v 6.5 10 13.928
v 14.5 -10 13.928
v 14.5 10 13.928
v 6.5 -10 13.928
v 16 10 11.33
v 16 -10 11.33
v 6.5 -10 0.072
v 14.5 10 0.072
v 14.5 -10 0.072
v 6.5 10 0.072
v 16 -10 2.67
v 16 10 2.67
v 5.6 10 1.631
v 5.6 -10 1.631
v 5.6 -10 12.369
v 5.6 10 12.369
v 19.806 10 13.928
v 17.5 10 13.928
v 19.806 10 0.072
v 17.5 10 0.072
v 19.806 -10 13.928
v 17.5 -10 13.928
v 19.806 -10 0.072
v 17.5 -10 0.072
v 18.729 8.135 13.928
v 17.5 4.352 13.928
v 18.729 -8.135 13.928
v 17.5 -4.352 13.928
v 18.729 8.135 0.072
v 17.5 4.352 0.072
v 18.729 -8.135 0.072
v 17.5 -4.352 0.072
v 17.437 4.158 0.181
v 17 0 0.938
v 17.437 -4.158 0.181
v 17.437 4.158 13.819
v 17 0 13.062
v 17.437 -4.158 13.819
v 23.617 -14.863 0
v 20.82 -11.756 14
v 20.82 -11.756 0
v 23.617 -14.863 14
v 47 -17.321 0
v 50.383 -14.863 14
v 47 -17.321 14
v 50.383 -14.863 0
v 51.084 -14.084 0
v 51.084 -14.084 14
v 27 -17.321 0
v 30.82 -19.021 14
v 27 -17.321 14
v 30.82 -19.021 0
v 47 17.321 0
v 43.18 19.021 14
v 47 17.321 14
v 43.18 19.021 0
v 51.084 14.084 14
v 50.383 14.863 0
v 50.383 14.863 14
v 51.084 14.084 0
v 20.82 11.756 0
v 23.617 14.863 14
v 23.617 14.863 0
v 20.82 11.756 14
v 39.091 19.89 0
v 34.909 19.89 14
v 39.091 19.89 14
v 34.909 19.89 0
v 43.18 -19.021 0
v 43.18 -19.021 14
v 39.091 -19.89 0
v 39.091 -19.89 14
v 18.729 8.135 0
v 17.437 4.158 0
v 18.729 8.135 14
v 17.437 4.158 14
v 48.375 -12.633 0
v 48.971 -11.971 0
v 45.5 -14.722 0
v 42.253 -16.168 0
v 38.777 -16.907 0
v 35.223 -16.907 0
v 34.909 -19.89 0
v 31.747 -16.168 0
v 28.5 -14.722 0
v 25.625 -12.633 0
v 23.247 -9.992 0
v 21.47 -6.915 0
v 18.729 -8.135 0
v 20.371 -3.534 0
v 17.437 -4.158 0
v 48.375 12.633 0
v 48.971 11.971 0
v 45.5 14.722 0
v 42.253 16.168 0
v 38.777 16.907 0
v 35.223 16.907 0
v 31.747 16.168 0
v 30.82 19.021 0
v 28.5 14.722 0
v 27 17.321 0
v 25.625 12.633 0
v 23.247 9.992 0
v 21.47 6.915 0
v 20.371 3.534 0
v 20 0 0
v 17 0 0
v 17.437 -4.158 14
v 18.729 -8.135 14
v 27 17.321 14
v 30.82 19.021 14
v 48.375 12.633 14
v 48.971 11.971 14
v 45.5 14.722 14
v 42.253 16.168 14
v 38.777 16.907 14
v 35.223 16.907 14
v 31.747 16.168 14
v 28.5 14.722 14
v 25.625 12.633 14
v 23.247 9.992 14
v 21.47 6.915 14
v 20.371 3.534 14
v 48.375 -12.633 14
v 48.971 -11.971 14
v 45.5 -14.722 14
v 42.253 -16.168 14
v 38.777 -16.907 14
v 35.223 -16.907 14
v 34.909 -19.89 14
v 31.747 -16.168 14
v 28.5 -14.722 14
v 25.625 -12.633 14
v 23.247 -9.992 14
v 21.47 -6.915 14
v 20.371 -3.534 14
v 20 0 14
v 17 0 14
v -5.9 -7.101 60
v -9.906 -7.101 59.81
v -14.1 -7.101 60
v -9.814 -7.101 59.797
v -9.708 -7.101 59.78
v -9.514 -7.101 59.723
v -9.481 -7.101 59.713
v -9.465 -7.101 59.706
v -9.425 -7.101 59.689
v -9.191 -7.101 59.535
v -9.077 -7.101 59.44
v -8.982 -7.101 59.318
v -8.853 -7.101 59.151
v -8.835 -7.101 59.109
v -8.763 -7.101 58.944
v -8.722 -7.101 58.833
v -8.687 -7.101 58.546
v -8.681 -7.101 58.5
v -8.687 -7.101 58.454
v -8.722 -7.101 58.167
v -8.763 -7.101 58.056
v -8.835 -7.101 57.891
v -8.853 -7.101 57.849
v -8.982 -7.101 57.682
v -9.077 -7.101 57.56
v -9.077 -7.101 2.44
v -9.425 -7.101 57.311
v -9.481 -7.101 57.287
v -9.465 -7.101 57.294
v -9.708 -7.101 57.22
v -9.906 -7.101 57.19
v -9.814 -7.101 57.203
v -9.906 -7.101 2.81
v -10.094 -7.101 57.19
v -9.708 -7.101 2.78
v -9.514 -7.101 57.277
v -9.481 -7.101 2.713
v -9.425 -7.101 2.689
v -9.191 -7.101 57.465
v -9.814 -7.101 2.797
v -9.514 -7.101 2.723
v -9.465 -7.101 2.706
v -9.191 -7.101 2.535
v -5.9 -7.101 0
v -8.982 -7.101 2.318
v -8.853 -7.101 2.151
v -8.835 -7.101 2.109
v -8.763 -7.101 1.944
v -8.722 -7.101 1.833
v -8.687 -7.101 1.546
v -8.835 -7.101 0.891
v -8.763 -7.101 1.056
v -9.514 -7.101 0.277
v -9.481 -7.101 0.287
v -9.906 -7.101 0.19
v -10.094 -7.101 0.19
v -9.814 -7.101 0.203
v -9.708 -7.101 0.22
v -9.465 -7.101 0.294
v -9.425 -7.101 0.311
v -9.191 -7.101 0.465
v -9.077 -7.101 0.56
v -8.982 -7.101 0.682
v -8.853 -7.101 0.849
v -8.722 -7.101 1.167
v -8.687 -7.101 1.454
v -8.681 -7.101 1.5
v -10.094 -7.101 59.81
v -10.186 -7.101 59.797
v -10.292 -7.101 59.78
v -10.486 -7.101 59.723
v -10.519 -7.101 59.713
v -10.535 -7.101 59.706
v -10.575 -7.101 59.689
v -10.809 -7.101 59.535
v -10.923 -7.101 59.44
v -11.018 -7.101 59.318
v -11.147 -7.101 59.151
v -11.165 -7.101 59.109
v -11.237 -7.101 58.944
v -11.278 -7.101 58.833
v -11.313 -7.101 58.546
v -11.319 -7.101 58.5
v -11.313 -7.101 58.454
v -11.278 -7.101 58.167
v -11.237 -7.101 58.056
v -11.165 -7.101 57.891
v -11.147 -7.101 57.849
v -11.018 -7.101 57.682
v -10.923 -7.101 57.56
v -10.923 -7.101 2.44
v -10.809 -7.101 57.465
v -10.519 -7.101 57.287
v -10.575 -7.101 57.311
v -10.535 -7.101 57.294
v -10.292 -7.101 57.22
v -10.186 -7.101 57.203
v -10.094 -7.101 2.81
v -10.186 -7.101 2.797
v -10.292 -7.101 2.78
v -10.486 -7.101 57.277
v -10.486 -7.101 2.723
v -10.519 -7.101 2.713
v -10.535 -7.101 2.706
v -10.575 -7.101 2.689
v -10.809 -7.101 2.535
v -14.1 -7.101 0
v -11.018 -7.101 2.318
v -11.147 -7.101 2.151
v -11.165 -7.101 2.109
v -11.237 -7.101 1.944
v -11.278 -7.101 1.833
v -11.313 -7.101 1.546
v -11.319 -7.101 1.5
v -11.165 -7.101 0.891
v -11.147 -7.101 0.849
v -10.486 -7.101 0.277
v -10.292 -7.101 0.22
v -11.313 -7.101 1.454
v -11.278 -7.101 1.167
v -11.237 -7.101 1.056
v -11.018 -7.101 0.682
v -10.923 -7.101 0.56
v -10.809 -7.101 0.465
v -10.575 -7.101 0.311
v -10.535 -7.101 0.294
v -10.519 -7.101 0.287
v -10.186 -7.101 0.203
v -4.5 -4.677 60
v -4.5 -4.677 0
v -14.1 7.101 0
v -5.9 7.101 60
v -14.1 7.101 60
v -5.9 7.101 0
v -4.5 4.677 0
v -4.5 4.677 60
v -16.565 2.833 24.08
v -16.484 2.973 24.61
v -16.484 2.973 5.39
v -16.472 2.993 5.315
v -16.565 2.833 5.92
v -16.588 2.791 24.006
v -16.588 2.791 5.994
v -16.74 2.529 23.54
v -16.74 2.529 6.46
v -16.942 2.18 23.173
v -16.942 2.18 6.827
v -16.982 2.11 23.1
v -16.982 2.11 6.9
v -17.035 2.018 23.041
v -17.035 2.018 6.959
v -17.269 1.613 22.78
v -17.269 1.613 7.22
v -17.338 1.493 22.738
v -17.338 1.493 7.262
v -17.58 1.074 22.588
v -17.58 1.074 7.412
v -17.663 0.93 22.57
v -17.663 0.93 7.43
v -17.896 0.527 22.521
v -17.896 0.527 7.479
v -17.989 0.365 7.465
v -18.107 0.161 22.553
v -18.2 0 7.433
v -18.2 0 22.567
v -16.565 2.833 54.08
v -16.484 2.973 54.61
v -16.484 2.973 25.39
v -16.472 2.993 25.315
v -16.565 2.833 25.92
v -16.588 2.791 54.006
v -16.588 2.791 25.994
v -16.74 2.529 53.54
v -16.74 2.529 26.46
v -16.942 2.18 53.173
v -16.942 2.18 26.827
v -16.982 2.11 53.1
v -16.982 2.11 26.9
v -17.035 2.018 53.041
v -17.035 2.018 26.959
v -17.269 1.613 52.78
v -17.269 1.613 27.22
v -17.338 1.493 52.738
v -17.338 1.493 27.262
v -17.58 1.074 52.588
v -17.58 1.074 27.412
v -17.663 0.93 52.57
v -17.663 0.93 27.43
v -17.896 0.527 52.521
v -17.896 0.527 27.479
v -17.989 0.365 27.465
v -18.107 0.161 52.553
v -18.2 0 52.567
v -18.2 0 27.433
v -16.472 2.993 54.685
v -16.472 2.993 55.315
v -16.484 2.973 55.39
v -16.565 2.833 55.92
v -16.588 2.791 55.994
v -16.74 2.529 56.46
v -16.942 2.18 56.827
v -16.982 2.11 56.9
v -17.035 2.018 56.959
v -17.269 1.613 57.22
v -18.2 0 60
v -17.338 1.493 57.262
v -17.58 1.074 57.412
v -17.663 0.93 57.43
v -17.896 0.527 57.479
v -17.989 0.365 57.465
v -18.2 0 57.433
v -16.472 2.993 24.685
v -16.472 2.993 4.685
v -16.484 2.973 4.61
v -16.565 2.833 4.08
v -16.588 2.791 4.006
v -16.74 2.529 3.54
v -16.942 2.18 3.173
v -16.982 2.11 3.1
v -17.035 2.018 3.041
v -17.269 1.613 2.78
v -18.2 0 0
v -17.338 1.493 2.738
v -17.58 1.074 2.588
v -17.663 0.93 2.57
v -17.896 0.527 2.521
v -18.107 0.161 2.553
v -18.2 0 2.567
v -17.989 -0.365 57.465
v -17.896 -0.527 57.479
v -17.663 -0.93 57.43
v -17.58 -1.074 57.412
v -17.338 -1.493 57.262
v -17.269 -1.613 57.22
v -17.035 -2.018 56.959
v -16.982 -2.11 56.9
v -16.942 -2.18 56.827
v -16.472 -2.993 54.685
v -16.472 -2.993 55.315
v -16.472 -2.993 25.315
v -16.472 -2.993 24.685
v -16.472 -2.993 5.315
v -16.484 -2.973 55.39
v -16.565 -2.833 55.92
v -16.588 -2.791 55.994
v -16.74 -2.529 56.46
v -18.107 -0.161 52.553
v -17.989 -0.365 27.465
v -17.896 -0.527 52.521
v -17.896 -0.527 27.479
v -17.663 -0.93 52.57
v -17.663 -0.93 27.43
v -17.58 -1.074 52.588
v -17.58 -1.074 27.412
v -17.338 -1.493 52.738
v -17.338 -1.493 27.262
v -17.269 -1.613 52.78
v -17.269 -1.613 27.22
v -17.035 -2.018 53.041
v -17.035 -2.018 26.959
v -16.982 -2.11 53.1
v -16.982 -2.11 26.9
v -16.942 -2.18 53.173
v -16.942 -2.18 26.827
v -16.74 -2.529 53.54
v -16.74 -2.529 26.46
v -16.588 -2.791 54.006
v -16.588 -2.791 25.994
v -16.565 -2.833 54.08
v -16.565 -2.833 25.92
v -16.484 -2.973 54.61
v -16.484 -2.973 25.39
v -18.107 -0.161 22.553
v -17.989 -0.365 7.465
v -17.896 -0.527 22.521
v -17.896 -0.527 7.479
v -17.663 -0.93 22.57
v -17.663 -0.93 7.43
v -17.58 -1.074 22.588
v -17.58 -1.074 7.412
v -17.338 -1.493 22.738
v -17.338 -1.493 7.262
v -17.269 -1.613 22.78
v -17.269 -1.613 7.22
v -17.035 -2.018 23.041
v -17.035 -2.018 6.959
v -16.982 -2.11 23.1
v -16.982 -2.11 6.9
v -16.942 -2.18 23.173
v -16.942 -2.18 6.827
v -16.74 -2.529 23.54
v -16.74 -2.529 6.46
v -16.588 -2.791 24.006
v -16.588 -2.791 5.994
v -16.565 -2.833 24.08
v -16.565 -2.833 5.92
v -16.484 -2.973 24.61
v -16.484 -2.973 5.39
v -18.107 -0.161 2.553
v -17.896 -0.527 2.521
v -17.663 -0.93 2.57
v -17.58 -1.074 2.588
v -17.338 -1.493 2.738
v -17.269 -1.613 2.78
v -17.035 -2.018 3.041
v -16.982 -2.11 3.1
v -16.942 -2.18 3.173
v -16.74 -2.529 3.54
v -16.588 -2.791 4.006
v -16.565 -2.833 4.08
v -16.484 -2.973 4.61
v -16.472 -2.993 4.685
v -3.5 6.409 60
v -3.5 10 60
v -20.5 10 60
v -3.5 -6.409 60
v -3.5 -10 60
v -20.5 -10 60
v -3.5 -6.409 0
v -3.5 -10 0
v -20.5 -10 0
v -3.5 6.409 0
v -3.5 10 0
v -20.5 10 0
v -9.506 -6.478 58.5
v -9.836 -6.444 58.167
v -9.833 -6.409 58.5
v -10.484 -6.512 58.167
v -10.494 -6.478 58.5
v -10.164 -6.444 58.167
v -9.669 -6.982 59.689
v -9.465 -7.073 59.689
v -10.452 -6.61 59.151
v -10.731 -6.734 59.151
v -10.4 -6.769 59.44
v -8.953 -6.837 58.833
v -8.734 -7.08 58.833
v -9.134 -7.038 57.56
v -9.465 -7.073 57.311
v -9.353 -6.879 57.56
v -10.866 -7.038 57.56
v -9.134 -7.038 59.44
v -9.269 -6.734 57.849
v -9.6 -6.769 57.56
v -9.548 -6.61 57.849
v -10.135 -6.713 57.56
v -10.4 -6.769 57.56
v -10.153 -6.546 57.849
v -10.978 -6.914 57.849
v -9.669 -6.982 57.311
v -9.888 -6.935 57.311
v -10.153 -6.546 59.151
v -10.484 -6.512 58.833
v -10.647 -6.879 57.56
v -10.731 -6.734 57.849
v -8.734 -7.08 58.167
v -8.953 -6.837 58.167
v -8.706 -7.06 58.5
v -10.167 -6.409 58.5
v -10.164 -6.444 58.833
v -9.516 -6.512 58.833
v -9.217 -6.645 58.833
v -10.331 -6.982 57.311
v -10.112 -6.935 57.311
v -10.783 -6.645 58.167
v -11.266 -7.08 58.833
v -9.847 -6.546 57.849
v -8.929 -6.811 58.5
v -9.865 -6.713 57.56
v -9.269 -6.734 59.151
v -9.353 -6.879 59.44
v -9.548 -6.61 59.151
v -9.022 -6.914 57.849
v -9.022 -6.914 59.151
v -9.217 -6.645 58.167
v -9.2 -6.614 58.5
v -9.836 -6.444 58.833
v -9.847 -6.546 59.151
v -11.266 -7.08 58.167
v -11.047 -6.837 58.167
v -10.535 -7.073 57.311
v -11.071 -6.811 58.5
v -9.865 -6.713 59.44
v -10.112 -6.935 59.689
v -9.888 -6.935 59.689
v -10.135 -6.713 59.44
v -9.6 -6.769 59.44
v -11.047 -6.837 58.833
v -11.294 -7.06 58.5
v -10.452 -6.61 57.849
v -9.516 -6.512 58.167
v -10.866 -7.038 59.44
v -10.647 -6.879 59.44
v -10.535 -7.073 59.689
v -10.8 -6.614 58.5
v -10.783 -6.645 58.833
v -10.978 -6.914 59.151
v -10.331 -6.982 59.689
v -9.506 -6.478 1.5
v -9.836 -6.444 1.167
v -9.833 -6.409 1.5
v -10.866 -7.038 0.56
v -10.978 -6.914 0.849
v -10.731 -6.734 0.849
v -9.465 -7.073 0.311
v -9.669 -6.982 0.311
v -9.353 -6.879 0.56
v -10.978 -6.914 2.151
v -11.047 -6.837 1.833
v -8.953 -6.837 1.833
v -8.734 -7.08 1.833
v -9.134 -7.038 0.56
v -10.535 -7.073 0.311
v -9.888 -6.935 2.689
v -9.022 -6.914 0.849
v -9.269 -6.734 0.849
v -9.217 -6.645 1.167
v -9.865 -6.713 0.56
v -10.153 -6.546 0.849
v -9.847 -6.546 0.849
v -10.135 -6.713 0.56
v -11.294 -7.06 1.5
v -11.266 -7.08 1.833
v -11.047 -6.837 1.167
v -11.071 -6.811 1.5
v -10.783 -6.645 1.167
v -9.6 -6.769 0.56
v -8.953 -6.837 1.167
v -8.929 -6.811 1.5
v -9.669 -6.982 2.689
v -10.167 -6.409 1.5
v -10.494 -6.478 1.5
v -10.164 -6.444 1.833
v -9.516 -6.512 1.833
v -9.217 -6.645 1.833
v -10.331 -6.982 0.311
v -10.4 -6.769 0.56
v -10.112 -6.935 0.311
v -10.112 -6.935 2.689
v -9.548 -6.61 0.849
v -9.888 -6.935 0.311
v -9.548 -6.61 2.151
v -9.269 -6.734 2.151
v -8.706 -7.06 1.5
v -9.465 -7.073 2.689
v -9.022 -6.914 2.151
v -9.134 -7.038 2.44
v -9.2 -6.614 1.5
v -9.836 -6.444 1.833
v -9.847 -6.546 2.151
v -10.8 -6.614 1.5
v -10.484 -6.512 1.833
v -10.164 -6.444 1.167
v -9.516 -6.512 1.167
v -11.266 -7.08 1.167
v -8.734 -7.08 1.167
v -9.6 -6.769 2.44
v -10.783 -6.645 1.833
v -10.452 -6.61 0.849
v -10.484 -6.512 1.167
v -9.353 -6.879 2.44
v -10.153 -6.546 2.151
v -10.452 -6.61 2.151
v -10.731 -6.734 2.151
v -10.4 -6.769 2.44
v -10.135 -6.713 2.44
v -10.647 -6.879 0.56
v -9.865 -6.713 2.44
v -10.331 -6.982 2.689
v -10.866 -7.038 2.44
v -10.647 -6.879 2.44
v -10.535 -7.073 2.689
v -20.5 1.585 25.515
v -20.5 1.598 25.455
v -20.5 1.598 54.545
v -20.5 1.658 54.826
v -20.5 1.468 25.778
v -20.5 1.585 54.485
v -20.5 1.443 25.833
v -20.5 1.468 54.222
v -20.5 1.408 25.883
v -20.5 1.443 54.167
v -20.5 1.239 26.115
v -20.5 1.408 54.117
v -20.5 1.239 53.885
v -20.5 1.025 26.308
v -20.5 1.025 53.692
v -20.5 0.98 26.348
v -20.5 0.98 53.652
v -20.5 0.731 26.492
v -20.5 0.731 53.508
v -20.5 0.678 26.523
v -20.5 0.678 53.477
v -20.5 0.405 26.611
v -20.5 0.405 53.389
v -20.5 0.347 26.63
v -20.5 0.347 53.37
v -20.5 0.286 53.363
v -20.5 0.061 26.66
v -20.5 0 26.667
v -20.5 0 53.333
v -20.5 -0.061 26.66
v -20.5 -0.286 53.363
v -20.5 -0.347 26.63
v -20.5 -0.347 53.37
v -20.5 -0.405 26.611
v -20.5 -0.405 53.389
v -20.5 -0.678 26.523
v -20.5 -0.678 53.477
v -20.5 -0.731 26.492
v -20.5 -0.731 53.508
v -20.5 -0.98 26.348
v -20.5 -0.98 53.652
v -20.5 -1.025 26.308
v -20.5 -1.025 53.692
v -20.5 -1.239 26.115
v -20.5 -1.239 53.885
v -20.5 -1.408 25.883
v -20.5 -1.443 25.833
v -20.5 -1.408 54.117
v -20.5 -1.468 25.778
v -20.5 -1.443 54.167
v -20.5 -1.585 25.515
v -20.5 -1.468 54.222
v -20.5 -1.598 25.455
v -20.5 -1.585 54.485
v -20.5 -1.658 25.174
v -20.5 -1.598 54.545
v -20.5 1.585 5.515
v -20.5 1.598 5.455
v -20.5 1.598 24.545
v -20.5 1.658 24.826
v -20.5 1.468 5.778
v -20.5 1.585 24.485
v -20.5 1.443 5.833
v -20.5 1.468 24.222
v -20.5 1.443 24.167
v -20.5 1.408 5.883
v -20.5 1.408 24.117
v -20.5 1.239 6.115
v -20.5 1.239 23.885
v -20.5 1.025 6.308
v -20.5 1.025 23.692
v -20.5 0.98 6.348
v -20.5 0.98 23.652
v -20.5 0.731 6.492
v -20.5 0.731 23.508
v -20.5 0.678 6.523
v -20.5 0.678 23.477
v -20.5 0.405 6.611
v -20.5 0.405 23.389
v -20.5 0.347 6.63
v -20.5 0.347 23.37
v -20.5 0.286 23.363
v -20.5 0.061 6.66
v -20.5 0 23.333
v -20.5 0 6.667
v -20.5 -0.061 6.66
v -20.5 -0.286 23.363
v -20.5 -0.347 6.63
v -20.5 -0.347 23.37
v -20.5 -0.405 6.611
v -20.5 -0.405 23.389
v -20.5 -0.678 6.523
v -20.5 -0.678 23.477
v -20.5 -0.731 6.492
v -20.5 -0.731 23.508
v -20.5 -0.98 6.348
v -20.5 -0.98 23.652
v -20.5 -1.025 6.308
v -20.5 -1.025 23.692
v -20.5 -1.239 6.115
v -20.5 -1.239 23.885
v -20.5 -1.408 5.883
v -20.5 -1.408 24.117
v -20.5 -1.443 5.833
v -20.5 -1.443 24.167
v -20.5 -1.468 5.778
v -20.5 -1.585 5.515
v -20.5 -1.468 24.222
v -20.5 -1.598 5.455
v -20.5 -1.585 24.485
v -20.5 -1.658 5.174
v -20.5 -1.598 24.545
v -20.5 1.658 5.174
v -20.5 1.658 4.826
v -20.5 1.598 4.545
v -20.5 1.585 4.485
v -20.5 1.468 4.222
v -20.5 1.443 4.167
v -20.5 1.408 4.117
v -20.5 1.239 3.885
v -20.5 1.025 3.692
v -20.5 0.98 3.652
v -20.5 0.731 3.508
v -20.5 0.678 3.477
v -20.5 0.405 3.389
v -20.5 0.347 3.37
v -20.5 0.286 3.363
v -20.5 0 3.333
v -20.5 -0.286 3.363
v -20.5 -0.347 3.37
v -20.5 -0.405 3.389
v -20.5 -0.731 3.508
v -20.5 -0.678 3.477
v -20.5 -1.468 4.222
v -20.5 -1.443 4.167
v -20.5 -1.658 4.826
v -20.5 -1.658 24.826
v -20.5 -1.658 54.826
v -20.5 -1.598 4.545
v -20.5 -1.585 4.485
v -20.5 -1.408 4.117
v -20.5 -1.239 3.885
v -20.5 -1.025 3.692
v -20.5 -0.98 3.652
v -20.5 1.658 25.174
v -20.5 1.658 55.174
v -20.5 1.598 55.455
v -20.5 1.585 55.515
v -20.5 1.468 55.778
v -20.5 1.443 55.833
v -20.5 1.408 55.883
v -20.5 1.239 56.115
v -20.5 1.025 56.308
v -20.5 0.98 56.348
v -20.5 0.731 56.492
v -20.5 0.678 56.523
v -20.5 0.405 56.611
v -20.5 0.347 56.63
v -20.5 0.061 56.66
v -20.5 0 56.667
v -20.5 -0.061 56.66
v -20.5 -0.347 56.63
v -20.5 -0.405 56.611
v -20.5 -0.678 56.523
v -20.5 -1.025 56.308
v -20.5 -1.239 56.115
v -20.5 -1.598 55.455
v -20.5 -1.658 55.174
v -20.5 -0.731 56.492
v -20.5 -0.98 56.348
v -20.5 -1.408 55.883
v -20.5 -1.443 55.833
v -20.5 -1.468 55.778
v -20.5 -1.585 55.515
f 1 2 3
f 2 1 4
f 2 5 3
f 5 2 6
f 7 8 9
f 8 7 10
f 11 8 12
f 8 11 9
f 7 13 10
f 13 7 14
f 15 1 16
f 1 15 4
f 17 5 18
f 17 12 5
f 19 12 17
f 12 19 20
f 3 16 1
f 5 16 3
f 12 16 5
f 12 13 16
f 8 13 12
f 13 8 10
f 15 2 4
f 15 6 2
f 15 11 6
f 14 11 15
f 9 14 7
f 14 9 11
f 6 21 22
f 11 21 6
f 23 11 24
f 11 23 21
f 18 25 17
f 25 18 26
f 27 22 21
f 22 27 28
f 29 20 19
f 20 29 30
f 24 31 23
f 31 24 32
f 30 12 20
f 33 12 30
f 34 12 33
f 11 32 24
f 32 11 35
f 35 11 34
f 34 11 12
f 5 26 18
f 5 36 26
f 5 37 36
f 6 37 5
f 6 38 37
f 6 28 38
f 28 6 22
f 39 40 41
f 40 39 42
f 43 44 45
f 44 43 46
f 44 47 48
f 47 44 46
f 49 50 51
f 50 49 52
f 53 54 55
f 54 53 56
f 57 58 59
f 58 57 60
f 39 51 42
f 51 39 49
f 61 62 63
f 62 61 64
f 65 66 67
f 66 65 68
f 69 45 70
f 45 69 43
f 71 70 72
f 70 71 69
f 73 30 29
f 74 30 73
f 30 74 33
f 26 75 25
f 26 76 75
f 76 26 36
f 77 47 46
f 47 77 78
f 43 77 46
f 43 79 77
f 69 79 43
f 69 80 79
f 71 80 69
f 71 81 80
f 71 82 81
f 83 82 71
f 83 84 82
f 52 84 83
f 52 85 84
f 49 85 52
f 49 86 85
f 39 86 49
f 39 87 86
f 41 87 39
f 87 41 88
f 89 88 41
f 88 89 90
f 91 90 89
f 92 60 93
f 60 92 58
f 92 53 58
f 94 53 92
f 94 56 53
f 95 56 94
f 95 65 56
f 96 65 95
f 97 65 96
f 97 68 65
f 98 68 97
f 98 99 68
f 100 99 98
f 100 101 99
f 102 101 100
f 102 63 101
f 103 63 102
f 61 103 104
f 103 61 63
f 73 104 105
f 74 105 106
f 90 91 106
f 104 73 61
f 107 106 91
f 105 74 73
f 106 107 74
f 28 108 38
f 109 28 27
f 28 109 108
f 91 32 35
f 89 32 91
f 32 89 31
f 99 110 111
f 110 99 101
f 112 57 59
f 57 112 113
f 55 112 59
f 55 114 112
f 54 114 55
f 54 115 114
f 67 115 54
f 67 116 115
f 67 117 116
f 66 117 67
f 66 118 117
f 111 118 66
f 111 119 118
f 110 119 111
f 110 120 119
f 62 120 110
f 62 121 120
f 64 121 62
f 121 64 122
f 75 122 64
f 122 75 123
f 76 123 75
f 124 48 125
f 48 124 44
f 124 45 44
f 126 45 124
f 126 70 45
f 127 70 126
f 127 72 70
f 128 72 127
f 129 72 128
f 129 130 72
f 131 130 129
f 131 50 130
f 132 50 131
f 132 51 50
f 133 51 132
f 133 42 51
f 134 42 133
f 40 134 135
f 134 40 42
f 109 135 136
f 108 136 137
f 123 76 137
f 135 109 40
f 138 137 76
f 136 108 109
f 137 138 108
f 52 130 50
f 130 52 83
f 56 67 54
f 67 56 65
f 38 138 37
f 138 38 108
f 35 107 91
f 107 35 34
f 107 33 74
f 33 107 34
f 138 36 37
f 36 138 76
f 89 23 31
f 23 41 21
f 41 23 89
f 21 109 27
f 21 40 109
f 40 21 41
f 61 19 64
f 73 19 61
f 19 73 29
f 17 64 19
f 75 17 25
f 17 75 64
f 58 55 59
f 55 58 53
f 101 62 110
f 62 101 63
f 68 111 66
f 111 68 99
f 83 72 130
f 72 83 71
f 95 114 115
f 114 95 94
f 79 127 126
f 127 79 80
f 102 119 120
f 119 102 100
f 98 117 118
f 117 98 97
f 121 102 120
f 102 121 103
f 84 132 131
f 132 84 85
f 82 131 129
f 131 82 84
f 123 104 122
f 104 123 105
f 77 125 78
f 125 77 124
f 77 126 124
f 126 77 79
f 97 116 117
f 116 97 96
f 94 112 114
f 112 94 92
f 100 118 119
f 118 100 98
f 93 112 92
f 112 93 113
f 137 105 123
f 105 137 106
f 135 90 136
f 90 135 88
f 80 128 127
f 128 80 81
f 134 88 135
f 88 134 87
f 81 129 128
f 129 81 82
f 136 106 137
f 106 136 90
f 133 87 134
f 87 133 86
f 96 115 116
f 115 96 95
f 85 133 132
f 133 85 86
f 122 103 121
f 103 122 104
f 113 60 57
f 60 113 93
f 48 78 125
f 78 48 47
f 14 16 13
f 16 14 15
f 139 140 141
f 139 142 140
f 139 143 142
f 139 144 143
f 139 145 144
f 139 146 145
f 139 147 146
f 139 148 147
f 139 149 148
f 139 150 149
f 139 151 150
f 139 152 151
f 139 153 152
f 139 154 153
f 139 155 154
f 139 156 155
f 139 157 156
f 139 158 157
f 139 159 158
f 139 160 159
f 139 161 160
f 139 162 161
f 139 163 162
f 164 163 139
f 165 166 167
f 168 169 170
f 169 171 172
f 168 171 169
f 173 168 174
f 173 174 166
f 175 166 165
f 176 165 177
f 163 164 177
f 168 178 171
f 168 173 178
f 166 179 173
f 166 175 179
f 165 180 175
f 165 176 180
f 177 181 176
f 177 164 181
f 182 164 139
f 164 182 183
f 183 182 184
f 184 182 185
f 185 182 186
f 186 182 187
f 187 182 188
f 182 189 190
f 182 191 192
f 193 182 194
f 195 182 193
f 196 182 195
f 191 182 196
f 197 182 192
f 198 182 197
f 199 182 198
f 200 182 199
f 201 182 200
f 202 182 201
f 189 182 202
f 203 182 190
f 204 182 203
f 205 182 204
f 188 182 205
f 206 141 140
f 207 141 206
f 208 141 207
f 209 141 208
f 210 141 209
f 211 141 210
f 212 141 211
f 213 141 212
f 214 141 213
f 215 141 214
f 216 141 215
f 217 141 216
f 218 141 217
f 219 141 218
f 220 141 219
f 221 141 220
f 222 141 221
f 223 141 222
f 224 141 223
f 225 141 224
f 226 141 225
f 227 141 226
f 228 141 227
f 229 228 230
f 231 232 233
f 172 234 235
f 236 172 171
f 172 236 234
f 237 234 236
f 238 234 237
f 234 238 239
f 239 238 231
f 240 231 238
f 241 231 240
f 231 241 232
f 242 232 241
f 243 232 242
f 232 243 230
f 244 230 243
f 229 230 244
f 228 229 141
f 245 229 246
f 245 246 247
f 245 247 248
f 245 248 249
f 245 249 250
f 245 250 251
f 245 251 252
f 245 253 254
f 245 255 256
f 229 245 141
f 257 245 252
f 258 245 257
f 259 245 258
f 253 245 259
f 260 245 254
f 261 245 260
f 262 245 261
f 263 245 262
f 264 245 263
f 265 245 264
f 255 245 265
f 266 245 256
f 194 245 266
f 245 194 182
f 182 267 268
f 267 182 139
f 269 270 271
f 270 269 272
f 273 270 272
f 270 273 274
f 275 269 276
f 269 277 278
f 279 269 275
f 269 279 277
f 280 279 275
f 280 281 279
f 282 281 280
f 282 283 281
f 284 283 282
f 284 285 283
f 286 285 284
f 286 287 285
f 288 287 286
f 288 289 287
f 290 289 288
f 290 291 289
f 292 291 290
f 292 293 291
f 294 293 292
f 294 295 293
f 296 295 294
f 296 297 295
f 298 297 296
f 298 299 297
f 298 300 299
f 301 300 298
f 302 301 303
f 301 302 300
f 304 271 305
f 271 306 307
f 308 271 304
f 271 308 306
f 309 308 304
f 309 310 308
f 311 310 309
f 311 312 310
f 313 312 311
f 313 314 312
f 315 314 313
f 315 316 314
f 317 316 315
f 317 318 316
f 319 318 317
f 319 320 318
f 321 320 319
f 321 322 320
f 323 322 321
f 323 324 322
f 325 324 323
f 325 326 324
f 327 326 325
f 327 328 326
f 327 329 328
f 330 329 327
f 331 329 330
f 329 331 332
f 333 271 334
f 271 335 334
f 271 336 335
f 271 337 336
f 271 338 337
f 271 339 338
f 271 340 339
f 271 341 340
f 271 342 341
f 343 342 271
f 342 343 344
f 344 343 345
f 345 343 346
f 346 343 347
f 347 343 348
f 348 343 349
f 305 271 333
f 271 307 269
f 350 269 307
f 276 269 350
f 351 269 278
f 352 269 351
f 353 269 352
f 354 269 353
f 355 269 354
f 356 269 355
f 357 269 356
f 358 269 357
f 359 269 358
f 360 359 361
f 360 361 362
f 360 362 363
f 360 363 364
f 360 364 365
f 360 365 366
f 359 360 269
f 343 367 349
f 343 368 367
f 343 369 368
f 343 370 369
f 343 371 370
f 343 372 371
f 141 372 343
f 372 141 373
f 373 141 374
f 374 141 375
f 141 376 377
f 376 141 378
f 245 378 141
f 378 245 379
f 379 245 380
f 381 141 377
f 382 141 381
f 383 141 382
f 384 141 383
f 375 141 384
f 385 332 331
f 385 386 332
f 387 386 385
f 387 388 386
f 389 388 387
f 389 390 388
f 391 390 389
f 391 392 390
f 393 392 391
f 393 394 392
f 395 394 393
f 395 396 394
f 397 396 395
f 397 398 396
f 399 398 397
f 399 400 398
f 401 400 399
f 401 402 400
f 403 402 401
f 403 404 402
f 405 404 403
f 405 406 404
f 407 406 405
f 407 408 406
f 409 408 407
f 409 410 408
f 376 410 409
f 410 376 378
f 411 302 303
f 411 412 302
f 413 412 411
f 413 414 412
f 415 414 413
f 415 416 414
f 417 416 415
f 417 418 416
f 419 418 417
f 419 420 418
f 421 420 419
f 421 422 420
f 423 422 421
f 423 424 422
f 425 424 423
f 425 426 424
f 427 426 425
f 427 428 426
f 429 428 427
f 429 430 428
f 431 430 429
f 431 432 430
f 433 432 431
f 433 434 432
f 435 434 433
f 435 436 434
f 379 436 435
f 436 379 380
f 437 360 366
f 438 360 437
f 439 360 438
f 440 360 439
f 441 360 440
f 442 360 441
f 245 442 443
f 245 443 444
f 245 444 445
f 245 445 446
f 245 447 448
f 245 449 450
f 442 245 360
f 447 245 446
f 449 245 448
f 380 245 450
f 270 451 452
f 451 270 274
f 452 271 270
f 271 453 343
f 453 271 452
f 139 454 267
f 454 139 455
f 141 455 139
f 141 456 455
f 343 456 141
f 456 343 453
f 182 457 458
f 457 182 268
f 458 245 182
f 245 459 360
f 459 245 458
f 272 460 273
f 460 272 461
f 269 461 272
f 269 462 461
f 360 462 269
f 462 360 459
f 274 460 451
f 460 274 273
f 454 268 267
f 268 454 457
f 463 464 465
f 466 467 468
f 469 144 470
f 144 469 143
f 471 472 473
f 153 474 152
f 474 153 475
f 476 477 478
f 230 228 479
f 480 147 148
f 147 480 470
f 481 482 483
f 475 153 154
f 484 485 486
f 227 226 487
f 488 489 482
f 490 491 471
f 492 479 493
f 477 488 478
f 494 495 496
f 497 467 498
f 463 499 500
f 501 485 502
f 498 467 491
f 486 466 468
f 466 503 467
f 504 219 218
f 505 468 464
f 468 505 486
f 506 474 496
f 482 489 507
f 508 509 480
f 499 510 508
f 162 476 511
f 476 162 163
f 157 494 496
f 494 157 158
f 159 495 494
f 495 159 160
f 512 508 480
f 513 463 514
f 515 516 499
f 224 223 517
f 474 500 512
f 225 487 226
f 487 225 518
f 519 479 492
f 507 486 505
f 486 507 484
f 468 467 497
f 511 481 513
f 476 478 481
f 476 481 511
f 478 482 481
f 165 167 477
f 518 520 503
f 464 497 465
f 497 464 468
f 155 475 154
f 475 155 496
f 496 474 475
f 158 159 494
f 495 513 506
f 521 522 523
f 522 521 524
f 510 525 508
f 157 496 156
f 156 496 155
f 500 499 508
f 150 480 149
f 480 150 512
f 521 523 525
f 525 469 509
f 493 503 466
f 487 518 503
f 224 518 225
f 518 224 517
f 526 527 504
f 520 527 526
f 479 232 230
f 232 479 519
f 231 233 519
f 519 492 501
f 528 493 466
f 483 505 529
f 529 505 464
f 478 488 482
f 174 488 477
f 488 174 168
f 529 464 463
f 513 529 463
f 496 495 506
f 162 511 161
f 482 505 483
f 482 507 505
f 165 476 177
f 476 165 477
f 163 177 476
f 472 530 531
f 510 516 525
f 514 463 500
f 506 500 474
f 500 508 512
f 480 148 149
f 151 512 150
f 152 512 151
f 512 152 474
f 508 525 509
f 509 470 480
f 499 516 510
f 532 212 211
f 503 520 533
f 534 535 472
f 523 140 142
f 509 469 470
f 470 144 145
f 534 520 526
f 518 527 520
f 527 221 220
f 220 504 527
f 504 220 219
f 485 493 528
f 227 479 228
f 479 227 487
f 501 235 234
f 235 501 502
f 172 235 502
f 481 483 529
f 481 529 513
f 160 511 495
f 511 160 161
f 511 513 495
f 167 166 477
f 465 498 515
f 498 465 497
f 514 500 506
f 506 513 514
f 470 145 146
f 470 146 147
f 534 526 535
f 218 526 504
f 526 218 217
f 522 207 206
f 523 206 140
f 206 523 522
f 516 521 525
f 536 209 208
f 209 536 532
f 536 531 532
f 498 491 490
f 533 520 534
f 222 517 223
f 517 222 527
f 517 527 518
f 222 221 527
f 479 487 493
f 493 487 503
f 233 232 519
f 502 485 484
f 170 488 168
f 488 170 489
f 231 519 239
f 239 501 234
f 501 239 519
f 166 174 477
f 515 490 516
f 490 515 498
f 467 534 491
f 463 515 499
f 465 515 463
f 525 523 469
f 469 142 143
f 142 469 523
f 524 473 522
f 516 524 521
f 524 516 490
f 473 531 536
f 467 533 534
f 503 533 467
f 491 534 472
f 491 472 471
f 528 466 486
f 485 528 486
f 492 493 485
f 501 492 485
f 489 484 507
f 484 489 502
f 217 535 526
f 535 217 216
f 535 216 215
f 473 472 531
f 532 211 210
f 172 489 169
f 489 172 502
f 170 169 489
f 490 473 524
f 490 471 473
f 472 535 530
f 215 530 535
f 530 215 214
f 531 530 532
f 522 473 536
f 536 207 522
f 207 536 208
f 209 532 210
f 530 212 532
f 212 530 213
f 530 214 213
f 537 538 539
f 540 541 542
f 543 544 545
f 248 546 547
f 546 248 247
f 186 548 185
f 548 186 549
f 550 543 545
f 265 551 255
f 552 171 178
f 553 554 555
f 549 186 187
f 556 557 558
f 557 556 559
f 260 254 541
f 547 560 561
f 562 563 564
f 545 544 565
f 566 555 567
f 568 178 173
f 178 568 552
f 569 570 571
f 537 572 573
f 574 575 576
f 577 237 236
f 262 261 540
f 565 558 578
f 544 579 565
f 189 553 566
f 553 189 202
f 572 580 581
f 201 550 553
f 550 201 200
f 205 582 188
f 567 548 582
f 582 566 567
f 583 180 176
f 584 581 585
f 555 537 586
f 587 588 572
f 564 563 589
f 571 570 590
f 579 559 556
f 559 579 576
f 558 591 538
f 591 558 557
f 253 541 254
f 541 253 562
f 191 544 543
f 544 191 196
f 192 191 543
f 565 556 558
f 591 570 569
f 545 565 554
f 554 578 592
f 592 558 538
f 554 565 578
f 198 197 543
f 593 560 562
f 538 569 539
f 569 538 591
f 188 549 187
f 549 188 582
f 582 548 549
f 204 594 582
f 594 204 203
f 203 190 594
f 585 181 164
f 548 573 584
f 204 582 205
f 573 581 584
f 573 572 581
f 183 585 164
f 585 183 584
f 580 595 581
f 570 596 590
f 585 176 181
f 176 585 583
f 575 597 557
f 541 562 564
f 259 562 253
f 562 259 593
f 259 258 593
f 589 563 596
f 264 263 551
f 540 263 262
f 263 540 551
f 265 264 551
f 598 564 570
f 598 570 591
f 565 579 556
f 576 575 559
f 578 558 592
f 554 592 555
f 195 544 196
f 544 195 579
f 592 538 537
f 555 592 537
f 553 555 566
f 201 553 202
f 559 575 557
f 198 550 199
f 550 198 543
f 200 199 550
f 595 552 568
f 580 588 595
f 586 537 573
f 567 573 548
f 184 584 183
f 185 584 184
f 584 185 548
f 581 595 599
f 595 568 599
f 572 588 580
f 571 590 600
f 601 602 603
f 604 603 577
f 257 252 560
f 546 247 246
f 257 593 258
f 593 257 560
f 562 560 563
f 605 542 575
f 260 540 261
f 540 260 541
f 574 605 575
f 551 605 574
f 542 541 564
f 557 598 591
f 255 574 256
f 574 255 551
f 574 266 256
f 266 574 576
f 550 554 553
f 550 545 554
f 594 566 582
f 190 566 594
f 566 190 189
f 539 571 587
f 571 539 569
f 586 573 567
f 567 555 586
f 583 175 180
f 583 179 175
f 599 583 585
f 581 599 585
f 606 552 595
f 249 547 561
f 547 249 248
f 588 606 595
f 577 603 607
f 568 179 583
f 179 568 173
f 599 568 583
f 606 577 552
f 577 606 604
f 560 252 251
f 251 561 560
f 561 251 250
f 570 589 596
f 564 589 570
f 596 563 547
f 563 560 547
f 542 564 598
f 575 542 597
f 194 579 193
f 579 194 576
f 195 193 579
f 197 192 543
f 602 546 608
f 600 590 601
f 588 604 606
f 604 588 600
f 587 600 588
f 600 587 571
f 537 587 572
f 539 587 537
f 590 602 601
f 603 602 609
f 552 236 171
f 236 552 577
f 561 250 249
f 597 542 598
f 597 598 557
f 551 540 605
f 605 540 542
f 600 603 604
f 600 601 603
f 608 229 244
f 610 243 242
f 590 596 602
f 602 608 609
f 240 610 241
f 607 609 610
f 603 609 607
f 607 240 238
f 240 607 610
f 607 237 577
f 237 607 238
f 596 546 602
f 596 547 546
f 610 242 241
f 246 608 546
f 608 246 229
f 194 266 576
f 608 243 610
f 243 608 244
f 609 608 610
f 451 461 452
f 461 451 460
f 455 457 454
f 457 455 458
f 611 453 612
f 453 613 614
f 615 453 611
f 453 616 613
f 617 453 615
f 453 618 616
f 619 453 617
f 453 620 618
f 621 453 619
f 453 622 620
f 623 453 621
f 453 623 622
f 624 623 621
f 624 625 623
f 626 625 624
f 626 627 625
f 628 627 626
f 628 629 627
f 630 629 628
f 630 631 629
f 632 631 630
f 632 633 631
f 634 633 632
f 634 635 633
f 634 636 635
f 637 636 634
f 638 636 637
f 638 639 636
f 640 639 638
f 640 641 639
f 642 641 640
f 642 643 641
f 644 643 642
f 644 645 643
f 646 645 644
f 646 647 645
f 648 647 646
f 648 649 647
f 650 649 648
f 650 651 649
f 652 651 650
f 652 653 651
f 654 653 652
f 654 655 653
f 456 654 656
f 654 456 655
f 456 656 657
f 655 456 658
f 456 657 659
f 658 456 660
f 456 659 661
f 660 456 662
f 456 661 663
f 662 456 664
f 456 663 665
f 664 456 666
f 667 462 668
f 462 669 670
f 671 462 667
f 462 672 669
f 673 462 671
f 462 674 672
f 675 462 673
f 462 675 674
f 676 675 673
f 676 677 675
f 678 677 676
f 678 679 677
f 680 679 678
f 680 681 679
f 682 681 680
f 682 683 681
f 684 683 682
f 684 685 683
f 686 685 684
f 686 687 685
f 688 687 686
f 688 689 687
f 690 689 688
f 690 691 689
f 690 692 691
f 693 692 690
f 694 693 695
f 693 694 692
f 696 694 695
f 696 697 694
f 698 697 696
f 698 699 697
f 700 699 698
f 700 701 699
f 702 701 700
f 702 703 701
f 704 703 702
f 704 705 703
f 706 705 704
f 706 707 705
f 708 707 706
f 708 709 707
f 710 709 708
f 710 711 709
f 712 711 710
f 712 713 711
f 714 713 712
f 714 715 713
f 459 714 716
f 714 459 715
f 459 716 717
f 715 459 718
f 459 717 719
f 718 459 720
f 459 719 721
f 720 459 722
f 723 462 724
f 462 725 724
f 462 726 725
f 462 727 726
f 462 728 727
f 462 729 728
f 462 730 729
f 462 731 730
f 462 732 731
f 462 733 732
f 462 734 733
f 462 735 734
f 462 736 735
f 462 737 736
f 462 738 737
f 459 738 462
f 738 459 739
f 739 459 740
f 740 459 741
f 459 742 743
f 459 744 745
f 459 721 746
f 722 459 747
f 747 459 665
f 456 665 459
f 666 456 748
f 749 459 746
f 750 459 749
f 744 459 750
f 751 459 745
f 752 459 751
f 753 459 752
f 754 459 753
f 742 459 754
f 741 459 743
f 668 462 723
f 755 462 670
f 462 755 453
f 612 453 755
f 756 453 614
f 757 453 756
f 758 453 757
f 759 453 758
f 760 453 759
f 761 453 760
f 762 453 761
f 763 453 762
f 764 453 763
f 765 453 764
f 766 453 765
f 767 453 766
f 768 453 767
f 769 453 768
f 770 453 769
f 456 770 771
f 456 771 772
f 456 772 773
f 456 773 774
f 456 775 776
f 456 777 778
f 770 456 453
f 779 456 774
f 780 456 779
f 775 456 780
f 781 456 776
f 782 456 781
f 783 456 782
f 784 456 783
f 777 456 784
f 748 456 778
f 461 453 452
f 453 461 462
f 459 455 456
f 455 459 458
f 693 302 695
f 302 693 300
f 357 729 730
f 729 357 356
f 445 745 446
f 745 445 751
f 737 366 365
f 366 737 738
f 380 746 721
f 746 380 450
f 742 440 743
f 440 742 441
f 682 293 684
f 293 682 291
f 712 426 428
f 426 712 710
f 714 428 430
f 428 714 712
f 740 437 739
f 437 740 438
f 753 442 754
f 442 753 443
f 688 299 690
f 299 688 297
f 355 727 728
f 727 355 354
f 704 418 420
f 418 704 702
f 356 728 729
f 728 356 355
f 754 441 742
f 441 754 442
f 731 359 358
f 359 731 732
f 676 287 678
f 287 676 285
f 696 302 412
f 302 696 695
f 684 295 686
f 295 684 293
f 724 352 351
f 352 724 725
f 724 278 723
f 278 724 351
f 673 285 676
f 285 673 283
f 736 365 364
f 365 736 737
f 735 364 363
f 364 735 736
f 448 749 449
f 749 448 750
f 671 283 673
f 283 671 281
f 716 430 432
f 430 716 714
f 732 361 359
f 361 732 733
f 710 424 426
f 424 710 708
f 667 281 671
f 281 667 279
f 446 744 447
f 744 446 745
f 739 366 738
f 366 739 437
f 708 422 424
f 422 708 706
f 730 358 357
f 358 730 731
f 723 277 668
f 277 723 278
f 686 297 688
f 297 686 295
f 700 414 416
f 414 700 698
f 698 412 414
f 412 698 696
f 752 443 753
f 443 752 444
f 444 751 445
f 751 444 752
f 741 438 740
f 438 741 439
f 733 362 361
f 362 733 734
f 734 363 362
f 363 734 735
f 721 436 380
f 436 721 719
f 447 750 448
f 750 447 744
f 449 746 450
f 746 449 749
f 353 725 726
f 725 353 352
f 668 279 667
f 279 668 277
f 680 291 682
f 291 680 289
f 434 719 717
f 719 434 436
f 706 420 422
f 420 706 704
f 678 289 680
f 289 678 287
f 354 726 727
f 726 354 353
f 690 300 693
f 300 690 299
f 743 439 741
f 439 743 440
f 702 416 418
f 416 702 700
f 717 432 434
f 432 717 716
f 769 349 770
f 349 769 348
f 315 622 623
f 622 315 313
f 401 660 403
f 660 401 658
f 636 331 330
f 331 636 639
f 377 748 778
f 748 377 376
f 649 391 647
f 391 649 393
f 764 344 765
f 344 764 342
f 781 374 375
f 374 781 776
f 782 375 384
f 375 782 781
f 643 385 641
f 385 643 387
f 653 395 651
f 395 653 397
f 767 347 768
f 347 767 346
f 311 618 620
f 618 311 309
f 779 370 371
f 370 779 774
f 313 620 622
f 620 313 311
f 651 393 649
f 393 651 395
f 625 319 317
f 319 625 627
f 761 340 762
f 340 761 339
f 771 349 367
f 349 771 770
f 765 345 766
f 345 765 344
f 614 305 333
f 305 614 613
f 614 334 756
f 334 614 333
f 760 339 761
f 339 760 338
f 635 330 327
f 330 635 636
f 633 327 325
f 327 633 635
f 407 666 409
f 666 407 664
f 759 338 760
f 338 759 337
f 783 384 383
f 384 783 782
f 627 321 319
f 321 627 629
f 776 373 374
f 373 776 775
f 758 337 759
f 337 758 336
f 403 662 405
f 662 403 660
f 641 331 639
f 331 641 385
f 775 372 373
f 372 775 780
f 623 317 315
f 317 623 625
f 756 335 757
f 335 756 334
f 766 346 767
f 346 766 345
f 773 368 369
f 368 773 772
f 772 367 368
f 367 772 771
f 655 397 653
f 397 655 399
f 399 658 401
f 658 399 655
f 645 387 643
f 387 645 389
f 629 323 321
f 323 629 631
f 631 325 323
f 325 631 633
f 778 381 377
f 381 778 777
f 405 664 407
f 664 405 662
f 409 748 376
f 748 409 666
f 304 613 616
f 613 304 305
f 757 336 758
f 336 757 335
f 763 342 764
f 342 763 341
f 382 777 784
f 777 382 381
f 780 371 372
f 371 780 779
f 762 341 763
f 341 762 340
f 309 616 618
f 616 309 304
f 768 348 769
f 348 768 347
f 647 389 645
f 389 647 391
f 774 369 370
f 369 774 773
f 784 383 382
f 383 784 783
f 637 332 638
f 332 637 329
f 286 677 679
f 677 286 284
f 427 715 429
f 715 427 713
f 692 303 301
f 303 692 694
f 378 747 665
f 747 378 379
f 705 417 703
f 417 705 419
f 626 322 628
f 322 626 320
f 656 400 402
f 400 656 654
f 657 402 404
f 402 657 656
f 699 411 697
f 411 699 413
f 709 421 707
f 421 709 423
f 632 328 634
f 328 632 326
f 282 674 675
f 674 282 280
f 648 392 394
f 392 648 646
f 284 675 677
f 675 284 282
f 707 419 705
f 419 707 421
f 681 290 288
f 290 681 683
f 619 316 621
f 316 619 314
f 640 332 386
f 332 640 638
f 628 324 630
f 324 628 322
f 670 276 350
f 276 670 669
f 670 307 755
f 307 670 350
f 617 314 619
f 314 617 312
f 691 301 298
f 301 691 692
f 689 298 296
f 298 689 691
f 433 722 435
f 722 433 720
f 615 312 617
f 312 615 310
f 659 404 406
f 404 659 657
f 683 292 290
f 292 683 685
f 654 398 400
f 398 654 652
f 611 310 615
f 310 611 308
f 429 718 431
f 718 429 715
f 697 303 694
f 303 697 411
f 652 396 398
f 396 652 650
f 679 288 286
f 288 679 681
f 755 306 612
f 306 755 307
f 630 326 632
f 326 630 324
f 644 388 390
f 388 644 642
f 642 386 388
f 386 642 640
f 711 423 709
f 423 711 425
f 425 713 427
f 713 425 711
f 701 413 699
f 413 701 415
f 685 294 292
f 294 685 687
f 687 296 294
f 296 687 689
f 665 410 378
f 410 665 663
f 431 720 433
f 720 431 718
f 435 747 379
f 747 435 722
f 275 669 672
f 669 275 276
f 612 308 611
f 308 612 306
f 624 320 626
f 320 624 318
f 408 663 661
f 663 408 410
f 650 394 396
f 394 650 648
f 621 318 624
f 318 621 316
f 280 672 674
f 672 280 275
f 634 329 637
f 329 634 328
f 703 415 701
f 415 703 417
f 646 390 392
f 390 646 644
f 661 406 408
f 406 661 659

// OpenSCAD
// Profil kolejnice

module slider(len=20, margin=0) {
	translate([-10,0,0]) cylinder(h=len, r=8+margin, $fn=6);
	translate([1,0,0]) cylinder(h=len, r=8+margin, $fn=6);	
}

// Drzak na tyc

translate([20+(34/2),0,0]) 
difference() {
	union() {
		cylinder(h=14, d=40);
		translate([-16.5,-10,7]) rotate([-90,0,0]) slider(len=20);
	}
	cylinder(h=30, d=34, center=true);
	rotate([0,0,-45]) cube([35,35, 20],center=false);
	translate([-33.4,0,0]) cube([4,40,40], center=true);
}

// Kolejnice

$fn=30;
//%translate([20.5,0,0])
difference() {
	translate([-12,0,30]) cube([17, 20, 60], center=true);
	difference() {
		slider(len=60, margin=0.2);
		//retencni vystupek
		translate([-10,-8,58.5]) sphere(r=1.6);
		translate([-10,-8,1.5]) sphere(r=1.6);
	}
	
	//diry na srouby
	translate([-15,0,5]) rotate([0,-90,0]) cylinder(d2=3, d1=7, h=6);
	translate([-15,0,55]) rotate([0,-90,0]) cylinder(d2=3, d1=7, h=6);
	translate([-15,0,25]) rotate([0,-90,0]) cylinder(d2=3, d1=7, h=6); //extra
}
